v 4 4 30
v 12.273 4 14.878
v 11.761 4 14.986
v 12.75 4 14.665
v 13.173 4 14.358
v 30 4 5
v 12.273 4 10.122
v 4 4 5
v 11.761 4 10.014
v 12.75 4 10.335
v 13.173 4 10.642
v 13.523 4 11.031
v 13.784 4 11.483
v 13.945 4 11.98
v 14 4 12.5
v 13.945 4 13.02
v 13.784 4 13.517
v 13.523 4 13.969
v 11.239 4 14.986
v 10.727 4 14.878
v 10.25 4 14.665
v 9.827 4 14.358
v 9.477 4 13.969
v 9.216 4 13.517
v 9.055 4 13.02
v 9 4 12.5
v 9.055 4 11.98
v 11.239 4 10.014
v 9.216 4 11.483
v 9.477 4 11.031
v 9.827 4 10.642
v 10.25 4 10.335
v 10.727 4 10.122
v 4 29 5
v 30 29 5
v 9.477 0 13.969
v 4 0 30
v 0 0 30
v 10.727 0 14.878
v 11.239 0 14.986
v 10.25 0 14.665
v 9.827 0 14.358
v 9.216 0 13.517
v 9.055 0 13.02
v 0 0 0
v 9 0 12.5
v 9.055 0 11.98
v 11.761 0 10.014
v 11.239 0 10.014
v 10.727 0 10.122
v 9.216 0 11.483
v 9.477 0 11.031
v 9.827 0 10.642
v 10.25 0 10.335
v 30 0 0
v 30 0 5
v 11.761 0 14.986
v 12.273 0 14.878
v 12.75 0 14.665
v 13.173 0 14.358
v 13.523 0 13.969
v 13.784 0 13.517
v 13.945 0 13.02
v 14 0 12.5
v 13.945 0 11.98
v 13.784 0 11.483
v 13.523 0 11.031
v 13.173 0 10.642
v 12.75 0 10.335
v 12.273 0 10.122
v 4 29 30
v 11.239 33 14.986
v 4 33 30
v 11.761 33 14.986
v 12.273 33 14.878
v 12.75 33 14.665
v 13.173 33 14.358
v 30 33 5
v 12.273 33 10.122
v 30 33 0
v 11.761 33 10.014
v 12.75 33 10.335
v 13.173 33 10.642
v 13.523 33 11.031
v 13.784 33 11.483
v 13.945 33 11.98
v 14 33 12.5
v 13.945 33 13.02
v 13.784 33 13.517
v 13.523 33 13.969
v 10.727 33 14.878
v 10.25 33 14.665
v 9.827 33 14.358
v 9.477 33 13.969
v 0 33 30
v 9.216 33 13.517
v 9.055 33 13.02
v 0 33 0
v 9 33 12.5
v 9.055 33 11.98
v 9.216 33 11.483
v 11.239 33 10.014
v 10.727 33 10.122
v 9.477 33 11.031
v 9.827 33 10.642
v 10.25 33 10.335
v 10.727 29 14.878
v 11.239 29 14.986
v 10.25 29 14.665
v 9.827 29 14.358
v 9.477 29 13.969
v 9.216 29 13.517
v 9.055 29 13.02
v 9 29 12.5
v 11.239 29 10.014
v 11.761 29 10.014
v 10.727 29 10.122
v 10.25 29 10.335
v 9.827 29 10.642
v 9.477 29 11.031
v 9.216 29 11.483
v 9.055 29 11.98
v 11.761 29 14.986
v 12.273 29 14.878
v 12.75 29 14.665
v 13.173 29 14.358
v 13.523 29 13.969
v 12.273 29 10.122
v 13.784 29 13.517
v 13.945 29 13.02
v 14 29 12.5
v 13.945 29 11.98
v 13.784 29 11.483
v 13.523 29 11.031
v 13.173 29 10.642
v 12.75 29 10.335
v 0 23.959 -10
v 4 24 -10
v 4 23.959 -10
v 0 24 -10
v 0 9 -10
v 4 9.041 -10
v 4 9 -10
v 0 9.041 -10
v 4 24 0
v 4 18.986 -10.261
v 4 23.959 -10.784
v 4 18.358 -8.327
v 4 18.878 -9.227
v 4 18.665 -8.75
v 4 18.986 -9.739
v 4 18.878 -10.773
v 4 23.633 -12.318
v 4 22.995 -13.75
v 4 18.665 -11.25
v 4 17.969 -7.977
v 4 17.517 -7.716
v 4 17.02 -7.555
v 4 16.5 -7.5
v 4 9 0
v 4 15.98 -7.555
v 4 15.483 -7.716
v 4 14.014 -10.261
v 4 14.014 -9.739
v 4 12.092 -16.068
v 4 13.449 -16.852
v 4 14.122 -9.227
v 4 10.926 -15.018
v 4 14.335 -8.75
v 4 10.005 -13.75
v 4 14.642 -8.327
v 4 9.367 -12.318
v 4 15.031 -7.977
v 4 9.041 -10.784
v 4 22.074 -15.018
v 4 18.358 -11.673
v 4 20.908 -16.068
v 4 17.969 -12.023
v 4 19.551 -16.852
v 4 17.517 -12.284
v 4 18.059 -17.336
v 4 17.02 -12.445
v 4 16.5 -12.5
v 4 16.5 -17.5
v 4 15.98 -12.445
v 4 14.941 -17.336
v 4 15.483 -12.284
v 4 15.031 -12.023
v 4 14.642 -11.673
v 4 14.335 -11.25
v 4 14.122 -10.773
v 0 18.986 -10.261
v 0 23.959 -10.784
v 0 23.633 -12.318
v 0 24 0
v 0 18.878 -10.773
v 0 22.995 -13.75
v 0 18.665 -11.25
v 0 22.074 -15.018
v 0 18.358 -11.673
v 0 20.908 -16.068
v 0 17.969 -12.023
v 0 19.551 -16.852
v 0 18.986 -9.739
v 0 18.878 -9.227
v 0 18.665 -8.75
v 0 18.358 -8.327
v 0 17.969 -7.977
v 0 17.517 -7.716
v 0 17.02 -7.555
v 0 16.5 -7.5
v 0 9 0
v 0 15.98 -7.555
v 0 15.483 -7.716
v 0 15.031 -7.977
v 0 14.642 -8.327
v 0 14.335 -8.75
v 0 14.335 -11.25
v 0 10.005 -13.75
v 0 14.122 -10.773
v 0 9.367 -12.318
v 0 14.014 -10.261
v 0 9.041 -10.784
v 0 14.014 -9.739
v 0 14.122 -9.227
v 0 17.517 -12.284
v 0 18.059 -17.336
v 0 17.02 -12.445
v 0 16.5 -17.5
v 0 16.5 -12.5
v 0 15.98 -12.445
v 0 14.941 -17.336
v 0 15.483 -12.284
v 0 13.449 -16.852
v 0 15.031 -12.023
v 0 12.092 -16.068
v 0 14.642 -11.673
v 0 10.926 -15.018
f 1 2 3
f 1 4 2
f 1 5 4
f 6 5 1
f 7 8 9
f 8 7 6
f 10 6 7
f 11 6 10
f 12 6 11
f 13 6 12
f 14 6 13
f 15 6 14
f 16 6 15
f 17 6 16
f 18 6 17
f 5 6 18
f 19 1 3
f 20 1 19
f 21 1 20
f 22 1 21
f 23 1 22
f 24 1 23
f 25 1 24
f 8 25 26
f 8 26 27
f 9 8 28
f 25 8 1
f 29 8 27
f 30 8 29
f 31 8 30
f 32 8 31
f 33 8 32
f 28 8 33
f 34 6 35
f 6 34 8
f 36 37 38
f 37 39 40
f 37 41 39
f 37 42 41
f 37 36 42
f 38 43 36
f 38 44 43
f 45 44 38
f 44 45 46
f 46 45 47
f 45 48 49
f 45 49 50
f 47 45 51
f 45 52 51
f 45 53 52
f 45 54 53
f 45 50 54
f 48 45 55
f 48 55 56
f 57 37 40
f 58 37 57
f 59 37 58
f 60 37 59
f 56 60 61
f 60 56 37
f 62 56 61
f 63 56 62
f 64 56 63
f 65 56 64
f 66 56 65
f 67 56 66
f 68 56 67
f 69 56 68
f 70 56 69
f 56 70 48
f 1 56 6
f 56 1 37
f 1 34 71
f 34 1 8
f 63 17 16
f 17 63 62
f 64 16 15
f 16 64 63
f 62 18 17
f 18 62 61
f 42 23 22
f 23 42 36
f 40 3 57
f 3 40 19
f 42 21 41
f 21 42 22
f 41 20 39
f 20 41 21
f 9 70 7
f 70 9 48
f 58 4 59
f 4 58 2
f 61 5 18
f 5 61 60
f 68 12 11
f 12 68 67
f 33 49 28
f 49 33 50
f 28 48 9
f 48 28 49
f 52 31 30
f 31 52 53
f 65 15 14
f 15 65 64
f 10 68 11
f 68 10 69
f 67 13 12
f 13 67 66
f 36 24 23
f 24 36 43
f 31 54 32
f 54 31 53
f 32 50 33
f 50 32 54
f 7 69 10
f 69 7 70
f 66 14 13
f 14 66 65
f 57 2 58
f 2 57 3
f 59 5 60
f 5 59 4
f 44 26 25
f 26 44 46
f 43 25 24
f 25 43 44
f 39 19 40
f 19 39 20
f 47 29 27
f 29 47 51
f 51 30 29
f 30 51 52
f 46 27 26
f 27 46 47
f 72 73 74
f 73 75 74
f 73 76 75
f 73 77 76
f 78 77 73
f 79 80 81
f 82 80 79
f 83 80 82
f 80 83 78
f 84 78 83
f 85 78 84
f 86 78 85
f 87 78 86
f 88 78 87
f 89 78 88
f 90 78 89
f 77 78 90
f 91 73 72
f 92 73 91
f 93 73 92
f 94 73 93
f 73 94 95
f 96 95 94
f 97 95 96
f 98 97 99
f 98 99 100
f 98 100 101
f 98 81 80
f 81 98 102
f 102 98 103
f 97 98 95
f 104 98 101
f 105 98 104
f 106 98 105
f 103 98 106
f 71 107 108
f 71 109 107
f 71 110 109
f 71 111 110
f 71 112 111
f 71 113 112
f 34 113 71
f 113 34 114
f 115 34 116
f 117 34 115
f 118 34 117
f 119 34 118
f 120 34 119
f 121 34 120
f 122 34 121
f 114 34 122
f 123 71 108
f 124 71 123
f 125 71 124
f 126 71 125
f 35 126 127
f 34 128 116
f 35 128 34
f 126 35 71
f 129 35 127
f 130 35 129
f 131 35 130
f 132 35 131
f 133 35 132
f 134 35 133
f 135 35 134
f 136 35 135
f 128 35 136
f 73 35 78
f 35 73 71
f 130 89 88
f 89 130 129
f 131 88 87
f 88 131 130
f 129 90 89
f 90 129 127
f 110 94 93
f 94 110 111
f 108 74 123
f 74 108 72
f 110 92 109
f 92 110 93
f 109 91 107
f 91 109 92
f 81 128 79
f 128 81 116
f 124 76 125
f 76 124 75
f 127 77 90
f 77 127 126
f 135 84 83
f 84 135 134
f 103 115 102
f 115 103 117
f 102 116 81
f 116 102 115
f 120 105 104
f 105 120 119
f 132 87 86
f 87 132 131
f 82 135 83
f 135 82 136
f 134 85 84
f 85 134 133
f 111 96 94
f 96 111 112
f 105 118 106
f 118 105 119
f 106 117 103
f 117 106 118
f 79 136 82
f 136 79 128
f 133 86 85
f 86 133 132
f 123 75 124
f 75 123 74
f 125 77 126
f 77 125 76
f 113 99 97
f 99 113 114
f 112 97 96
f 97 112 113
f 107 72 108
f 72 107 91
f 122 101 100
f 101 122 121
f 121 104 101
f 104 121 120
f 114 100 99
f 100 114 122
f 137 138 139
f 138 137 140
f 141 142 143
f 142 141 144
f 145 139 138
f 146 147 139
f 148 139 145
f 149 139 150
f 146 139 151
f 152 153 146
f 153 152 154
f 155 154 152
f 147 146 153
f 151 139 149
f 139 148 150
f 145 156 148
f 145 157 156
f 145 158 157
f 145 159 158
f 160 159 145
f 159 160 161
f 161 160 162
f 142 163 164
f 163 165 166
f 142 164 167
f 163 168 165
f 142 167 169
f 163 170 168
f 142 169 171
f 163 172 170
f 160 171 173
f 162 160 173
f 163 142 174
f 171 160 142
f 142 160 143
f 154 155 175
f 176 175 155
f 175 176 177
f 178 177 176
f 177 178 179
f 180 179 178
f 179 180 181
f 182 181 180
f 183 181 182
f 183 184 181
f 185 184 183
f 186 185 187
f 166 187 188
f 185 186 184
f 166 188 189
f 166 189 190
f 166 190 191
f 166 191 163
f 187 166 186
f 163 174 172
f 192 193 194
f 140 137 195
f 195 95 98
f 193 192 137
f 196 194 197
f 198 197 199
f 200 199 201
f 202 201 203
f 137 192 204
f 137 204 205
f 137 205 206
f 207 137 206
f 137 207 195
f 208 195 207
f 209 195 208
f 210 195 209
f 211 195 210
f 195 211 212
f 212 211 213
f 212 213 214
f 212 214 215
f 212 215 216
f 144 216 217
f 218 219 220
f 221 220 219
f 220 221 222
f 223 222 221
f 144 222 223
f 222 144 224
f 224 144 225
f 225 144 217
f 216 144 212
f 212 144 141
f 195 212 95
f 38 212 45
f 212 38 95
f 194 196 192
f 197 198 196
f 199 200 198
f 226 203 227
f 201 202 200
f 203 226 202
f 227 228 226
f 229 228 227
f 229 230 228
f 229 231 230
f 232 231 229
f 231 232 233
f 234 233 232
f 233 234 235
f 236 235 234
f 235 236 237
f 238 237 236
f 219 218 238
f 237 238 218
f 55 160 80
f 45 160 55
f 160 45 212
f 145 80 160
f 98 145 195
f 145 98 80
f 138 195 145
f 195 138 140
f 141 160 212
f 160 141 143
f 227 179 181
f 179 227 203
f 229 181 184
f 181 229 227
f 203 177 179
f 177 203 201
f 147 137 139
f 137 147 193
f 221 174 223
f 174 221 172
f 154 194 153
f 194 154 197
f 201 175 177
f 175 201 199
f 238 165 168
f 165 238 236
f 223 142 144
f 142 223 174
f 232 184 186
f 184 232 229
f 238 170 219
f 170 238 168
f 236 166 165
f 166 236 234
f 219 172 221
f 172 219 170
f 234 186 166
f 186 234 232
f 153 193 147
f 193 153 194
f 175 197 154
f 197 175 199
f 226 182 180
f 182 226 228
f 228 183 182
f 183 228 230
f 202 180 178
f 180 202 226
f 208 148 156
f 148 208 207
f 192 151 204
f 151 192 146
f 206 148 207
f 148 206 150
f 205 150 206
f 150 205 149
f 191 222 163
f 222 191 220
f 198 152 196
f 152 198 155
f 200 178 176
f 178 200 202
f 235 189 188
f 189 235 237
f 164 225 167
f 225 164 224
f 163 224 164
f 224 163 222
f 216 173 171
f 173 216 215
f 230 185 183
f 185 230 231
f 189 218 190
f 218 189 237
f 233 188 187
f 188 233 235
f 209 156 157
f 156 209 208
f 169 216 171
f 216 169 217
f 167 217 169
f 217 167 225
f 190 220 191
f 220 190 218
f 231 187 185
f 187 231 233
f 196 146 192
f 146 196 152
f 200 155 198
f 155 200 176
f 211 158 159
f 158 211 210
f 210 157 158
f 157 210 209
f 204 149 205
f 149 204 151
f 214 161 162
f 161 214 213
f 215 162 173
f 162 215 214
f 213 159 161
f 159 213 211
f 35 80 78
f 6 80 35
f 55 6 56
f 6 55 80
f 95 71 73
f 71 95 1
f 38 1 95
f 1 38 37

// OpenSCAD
// Author: Charlie Snyder
// Twitter Handle: @mjrsnyder

$fn=30;
depth=25;


module bracket_side(wall_width, base_thickness, bracket_length, bracket_height) {
    screw_size=5; 
    rotate(a=[90,0,0]){
        difference(){
            linear_extrude(height=wall_width) {
                polygon(points=[[0,0],[bracket_length-wall_width,0],[0,bracket_height-base_thickness],[0,0]]);
            }
            translate([7.5,7.5]){
                cylinder(h=wall_width, d=screw_size);
            }
        }
    }
    
}


module screw_mount(screw_size, base_thickness, mount_width, mount_depth) {
        difference(){
            union(){
                cube([mount_depth,mount_width,base_thickness]);
                translate([mount_depth,mount_width/2,0]){
                    cylinder(h=base_thickness, d=mount_width);
                }
            }
            translate([mount_depth,mount_width/2,0]){
                cylinder(h=base_thickness, d=screw_size);
            }
            
        }
    }


module fan_bracket(depth) {

    wall_width=4;
    base_thickness=5;
    bracket_length=30;
    bracket_height=30;
    screw_mount_width=15;
    screw_mount_depth=10;
    screw_size=5;
    
    //base
    cube([bracket_length,depth+(wall_width*2),base_thickness]);
   
    // back
    translate([0,0,base_thickness]){
        cube([wall_width,depth+(wall_width*2),bracket_height-base_thickness]);
    }
    
    // sides
    translate([wall_width,wall_width,base_thickness]){
        bracket_side(wall_width, base_thickness, bracket_length, bracket_height);
    }

    translate([wall_width,depth+(wall_width*2),base_thickness]){
        bracket_side(wall_width, base_thickness, bracket_length, bracket_height);
    }
    
    // screw mounts
    rotate(a=[0,90,0]){
        translate([0,(depth+(wall_width*2))/2-(screw_mount_width)/2,0]){
            screw_mount(screw_size, wall_width, screw_mount_width, screw_mount_depth);
        }
    }
}


fan_bracket(depth);
